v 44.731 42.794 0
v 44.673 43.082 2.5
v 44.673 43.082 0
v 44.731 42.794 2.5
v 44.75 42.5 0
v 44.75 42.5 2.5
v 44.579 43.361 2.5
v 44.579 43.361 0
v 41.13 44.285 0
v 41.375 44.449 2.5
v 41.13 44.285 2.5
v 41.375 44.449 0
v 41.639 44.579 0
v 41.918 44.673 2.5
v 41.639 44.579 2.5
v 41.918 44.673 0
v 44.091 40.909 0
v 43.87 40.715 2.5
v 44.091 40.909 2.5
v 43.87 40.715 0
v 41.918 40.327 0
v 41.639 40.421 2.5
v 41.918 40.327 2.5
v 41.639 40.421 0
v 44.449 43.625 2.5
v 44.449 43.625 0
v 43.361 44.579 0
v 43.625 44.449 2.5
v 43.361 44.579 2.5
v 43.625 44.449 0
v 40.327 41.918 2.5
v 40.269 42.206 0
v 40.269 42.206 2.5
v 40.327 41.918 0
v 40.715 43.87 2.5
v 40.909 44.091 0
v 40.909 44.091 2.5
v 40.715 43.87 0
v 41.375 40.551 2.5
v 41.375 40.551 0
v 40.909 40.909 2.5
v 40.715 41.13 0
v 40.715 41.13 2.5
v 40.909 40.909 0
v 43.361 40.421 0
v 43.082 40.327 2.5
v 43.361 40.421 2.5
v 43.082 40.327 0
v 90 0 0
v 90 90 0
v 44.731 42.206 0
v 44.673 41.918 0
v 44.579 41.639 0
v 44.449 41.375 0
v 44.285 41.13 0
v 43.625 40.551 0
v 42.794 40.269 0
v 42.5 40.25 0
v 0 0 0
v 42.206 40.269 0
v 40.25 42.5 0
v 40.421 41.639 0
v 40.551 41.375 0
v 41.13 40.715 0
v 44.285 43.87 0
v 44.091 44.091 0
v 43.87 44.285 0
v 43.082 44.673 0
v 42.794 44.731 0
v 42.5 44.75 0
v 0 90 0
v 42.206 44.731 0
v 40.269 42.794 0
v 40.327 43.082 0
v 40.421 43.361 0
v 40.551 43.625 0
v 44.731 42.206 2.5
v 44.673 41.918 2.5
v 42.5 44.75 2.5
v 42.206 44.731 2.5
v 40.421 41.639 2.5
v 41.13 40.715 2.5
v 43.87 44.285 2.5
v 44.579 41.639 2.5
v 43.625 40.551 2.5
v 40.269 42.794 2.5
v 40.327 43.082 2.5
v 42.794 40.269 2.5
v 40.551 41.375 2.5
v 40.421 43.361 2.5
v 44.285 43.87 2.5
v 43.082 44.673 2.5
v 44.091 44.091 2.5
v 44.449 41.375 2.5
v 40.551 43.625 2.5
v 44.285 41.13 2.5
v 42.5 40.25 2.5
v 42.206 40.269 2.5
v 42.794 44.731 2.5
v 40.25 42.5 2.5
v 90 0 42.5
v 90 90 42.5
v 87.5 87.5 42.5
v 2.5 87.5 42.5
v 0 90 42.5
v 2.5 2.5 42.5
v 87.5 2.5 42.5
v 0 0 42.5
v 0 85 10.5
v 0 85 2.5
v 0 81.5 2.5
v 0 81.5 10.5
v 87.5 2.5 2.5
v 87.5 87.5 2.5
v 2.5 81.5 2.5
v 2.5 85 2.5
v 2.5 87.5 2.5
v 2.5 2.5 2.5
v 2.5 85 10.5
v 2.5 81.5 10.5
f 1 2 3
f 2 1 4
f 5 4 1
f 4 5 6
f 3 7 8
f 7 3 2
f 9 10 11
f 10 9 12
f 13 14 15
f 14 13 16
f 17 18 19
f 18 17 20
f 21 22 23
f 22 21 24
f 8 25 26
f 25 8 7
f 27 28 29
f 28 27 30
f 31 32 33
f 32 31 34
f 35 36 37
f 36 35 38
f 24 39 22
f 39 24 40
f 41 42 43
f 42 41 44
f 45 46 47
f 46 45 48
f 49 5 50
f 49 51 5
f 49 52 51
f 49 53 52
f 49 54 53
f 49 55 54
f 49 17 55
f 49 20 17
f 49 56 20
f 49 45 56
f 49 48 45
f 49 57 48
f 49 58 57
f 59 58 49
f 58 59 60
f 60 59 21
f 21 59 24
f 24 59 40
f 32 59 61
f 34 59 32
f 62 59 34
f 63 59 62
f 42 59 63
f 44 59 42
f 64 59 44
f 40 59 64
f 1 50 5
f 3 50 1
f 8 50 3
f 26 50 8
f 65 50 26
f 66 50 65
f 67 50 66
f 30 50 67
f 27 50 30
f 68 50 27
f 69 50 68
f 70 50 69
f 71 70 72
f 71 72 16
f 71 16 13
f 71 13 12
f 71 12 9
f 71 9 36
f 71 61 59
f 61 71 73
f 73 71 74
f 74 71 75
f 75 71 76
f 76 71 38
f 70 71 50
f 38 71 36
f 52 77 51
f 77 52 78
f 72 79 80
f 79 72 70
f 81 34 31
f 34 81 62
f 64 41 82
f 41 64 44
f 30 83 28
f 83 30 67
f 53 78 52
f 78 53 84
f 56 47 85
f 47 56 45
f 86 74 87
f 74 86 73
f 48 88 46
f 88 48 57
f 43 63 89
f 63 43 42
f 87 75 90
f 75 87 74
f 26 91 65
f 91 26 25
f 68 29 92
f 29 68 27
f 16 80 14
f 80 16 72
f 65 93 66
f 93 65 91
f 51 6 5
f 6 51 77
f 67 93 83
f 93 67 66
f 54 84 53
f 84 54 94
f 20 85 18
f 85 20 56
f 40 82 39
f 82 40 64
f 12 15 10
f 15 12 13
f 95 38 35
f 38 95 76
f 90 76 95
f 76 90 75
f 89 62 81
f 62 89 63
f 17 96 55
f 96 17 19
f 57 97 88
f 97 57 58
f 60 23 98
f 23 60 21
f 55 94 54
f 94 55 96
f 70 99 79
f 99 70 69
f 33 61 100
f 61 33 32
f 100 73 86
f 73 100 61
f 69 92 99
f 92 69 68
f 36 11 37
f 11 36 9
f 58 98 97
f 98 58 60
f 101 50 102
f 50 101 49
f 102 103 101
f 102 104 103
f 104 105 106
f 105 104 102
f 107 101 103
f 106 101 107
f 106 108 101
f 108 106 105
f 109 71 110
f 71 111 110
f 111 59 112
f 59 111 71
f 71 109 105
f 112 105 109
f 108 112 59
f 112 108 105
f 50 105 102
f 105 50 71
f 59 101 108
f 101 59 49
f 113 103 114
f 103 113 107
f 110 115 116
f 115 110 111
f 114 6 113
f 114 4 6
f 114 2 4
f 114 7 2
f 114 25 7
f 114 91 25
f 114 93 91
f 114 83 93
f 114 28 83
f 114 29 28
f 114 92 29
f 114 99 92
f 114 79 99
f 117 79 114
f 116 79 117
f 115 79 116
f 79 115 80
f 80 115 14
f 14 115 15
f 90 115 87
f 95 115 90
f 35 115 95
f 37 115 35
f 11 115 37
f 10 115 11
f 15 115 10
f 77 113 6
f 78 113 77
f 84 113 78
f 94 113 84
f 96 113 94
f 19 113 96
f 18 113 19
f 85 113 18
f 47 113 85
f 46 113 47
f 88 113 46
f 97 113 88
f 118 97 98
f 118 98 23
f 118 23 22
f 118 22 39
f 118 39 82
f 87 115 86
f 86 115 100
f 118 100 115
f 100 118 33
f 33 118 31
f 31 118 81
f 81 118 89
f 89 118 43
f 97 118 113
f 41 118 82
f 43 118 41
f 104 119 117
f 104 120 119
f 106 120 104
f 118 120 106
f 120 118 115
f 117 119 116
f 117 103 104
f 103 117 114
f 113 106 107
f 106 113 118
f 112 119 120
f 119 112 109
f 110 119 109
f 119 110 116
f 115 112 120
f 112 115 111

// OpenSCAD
// Fan box - an open box (top open) housing for a round PC case fan, e.g. an 80 mm fan. NOVEL part.
//

top    = 90;
height = 40;
wall   = 2.5;
screw  = 4.5;

$fn = 48;

inner = top - 2 * wall;

difference() {
    cube([top, top, height + wall]);                 // outer block, floor included
    translate([wall, wall, wall]) cube([inner, inner, height]);   // hollow: open top at z = height + wall
    for (sx = [-1, 1]) for (sy = [-1, 1])
        translate([sx * 0.5 * (top - 2 * wall), sy * 0.5 * (top - 2 * wall), 0])
            cylinder(h = height + 1, d = screw);                 // screw holes through the floor
    // one cable notch in a wall: 12 mm wide, centred along the wall, 8 mm deep from the open edge
    translate([0, top - wall - 6, wall]) cube([12, wall + 1, 8]);
}
